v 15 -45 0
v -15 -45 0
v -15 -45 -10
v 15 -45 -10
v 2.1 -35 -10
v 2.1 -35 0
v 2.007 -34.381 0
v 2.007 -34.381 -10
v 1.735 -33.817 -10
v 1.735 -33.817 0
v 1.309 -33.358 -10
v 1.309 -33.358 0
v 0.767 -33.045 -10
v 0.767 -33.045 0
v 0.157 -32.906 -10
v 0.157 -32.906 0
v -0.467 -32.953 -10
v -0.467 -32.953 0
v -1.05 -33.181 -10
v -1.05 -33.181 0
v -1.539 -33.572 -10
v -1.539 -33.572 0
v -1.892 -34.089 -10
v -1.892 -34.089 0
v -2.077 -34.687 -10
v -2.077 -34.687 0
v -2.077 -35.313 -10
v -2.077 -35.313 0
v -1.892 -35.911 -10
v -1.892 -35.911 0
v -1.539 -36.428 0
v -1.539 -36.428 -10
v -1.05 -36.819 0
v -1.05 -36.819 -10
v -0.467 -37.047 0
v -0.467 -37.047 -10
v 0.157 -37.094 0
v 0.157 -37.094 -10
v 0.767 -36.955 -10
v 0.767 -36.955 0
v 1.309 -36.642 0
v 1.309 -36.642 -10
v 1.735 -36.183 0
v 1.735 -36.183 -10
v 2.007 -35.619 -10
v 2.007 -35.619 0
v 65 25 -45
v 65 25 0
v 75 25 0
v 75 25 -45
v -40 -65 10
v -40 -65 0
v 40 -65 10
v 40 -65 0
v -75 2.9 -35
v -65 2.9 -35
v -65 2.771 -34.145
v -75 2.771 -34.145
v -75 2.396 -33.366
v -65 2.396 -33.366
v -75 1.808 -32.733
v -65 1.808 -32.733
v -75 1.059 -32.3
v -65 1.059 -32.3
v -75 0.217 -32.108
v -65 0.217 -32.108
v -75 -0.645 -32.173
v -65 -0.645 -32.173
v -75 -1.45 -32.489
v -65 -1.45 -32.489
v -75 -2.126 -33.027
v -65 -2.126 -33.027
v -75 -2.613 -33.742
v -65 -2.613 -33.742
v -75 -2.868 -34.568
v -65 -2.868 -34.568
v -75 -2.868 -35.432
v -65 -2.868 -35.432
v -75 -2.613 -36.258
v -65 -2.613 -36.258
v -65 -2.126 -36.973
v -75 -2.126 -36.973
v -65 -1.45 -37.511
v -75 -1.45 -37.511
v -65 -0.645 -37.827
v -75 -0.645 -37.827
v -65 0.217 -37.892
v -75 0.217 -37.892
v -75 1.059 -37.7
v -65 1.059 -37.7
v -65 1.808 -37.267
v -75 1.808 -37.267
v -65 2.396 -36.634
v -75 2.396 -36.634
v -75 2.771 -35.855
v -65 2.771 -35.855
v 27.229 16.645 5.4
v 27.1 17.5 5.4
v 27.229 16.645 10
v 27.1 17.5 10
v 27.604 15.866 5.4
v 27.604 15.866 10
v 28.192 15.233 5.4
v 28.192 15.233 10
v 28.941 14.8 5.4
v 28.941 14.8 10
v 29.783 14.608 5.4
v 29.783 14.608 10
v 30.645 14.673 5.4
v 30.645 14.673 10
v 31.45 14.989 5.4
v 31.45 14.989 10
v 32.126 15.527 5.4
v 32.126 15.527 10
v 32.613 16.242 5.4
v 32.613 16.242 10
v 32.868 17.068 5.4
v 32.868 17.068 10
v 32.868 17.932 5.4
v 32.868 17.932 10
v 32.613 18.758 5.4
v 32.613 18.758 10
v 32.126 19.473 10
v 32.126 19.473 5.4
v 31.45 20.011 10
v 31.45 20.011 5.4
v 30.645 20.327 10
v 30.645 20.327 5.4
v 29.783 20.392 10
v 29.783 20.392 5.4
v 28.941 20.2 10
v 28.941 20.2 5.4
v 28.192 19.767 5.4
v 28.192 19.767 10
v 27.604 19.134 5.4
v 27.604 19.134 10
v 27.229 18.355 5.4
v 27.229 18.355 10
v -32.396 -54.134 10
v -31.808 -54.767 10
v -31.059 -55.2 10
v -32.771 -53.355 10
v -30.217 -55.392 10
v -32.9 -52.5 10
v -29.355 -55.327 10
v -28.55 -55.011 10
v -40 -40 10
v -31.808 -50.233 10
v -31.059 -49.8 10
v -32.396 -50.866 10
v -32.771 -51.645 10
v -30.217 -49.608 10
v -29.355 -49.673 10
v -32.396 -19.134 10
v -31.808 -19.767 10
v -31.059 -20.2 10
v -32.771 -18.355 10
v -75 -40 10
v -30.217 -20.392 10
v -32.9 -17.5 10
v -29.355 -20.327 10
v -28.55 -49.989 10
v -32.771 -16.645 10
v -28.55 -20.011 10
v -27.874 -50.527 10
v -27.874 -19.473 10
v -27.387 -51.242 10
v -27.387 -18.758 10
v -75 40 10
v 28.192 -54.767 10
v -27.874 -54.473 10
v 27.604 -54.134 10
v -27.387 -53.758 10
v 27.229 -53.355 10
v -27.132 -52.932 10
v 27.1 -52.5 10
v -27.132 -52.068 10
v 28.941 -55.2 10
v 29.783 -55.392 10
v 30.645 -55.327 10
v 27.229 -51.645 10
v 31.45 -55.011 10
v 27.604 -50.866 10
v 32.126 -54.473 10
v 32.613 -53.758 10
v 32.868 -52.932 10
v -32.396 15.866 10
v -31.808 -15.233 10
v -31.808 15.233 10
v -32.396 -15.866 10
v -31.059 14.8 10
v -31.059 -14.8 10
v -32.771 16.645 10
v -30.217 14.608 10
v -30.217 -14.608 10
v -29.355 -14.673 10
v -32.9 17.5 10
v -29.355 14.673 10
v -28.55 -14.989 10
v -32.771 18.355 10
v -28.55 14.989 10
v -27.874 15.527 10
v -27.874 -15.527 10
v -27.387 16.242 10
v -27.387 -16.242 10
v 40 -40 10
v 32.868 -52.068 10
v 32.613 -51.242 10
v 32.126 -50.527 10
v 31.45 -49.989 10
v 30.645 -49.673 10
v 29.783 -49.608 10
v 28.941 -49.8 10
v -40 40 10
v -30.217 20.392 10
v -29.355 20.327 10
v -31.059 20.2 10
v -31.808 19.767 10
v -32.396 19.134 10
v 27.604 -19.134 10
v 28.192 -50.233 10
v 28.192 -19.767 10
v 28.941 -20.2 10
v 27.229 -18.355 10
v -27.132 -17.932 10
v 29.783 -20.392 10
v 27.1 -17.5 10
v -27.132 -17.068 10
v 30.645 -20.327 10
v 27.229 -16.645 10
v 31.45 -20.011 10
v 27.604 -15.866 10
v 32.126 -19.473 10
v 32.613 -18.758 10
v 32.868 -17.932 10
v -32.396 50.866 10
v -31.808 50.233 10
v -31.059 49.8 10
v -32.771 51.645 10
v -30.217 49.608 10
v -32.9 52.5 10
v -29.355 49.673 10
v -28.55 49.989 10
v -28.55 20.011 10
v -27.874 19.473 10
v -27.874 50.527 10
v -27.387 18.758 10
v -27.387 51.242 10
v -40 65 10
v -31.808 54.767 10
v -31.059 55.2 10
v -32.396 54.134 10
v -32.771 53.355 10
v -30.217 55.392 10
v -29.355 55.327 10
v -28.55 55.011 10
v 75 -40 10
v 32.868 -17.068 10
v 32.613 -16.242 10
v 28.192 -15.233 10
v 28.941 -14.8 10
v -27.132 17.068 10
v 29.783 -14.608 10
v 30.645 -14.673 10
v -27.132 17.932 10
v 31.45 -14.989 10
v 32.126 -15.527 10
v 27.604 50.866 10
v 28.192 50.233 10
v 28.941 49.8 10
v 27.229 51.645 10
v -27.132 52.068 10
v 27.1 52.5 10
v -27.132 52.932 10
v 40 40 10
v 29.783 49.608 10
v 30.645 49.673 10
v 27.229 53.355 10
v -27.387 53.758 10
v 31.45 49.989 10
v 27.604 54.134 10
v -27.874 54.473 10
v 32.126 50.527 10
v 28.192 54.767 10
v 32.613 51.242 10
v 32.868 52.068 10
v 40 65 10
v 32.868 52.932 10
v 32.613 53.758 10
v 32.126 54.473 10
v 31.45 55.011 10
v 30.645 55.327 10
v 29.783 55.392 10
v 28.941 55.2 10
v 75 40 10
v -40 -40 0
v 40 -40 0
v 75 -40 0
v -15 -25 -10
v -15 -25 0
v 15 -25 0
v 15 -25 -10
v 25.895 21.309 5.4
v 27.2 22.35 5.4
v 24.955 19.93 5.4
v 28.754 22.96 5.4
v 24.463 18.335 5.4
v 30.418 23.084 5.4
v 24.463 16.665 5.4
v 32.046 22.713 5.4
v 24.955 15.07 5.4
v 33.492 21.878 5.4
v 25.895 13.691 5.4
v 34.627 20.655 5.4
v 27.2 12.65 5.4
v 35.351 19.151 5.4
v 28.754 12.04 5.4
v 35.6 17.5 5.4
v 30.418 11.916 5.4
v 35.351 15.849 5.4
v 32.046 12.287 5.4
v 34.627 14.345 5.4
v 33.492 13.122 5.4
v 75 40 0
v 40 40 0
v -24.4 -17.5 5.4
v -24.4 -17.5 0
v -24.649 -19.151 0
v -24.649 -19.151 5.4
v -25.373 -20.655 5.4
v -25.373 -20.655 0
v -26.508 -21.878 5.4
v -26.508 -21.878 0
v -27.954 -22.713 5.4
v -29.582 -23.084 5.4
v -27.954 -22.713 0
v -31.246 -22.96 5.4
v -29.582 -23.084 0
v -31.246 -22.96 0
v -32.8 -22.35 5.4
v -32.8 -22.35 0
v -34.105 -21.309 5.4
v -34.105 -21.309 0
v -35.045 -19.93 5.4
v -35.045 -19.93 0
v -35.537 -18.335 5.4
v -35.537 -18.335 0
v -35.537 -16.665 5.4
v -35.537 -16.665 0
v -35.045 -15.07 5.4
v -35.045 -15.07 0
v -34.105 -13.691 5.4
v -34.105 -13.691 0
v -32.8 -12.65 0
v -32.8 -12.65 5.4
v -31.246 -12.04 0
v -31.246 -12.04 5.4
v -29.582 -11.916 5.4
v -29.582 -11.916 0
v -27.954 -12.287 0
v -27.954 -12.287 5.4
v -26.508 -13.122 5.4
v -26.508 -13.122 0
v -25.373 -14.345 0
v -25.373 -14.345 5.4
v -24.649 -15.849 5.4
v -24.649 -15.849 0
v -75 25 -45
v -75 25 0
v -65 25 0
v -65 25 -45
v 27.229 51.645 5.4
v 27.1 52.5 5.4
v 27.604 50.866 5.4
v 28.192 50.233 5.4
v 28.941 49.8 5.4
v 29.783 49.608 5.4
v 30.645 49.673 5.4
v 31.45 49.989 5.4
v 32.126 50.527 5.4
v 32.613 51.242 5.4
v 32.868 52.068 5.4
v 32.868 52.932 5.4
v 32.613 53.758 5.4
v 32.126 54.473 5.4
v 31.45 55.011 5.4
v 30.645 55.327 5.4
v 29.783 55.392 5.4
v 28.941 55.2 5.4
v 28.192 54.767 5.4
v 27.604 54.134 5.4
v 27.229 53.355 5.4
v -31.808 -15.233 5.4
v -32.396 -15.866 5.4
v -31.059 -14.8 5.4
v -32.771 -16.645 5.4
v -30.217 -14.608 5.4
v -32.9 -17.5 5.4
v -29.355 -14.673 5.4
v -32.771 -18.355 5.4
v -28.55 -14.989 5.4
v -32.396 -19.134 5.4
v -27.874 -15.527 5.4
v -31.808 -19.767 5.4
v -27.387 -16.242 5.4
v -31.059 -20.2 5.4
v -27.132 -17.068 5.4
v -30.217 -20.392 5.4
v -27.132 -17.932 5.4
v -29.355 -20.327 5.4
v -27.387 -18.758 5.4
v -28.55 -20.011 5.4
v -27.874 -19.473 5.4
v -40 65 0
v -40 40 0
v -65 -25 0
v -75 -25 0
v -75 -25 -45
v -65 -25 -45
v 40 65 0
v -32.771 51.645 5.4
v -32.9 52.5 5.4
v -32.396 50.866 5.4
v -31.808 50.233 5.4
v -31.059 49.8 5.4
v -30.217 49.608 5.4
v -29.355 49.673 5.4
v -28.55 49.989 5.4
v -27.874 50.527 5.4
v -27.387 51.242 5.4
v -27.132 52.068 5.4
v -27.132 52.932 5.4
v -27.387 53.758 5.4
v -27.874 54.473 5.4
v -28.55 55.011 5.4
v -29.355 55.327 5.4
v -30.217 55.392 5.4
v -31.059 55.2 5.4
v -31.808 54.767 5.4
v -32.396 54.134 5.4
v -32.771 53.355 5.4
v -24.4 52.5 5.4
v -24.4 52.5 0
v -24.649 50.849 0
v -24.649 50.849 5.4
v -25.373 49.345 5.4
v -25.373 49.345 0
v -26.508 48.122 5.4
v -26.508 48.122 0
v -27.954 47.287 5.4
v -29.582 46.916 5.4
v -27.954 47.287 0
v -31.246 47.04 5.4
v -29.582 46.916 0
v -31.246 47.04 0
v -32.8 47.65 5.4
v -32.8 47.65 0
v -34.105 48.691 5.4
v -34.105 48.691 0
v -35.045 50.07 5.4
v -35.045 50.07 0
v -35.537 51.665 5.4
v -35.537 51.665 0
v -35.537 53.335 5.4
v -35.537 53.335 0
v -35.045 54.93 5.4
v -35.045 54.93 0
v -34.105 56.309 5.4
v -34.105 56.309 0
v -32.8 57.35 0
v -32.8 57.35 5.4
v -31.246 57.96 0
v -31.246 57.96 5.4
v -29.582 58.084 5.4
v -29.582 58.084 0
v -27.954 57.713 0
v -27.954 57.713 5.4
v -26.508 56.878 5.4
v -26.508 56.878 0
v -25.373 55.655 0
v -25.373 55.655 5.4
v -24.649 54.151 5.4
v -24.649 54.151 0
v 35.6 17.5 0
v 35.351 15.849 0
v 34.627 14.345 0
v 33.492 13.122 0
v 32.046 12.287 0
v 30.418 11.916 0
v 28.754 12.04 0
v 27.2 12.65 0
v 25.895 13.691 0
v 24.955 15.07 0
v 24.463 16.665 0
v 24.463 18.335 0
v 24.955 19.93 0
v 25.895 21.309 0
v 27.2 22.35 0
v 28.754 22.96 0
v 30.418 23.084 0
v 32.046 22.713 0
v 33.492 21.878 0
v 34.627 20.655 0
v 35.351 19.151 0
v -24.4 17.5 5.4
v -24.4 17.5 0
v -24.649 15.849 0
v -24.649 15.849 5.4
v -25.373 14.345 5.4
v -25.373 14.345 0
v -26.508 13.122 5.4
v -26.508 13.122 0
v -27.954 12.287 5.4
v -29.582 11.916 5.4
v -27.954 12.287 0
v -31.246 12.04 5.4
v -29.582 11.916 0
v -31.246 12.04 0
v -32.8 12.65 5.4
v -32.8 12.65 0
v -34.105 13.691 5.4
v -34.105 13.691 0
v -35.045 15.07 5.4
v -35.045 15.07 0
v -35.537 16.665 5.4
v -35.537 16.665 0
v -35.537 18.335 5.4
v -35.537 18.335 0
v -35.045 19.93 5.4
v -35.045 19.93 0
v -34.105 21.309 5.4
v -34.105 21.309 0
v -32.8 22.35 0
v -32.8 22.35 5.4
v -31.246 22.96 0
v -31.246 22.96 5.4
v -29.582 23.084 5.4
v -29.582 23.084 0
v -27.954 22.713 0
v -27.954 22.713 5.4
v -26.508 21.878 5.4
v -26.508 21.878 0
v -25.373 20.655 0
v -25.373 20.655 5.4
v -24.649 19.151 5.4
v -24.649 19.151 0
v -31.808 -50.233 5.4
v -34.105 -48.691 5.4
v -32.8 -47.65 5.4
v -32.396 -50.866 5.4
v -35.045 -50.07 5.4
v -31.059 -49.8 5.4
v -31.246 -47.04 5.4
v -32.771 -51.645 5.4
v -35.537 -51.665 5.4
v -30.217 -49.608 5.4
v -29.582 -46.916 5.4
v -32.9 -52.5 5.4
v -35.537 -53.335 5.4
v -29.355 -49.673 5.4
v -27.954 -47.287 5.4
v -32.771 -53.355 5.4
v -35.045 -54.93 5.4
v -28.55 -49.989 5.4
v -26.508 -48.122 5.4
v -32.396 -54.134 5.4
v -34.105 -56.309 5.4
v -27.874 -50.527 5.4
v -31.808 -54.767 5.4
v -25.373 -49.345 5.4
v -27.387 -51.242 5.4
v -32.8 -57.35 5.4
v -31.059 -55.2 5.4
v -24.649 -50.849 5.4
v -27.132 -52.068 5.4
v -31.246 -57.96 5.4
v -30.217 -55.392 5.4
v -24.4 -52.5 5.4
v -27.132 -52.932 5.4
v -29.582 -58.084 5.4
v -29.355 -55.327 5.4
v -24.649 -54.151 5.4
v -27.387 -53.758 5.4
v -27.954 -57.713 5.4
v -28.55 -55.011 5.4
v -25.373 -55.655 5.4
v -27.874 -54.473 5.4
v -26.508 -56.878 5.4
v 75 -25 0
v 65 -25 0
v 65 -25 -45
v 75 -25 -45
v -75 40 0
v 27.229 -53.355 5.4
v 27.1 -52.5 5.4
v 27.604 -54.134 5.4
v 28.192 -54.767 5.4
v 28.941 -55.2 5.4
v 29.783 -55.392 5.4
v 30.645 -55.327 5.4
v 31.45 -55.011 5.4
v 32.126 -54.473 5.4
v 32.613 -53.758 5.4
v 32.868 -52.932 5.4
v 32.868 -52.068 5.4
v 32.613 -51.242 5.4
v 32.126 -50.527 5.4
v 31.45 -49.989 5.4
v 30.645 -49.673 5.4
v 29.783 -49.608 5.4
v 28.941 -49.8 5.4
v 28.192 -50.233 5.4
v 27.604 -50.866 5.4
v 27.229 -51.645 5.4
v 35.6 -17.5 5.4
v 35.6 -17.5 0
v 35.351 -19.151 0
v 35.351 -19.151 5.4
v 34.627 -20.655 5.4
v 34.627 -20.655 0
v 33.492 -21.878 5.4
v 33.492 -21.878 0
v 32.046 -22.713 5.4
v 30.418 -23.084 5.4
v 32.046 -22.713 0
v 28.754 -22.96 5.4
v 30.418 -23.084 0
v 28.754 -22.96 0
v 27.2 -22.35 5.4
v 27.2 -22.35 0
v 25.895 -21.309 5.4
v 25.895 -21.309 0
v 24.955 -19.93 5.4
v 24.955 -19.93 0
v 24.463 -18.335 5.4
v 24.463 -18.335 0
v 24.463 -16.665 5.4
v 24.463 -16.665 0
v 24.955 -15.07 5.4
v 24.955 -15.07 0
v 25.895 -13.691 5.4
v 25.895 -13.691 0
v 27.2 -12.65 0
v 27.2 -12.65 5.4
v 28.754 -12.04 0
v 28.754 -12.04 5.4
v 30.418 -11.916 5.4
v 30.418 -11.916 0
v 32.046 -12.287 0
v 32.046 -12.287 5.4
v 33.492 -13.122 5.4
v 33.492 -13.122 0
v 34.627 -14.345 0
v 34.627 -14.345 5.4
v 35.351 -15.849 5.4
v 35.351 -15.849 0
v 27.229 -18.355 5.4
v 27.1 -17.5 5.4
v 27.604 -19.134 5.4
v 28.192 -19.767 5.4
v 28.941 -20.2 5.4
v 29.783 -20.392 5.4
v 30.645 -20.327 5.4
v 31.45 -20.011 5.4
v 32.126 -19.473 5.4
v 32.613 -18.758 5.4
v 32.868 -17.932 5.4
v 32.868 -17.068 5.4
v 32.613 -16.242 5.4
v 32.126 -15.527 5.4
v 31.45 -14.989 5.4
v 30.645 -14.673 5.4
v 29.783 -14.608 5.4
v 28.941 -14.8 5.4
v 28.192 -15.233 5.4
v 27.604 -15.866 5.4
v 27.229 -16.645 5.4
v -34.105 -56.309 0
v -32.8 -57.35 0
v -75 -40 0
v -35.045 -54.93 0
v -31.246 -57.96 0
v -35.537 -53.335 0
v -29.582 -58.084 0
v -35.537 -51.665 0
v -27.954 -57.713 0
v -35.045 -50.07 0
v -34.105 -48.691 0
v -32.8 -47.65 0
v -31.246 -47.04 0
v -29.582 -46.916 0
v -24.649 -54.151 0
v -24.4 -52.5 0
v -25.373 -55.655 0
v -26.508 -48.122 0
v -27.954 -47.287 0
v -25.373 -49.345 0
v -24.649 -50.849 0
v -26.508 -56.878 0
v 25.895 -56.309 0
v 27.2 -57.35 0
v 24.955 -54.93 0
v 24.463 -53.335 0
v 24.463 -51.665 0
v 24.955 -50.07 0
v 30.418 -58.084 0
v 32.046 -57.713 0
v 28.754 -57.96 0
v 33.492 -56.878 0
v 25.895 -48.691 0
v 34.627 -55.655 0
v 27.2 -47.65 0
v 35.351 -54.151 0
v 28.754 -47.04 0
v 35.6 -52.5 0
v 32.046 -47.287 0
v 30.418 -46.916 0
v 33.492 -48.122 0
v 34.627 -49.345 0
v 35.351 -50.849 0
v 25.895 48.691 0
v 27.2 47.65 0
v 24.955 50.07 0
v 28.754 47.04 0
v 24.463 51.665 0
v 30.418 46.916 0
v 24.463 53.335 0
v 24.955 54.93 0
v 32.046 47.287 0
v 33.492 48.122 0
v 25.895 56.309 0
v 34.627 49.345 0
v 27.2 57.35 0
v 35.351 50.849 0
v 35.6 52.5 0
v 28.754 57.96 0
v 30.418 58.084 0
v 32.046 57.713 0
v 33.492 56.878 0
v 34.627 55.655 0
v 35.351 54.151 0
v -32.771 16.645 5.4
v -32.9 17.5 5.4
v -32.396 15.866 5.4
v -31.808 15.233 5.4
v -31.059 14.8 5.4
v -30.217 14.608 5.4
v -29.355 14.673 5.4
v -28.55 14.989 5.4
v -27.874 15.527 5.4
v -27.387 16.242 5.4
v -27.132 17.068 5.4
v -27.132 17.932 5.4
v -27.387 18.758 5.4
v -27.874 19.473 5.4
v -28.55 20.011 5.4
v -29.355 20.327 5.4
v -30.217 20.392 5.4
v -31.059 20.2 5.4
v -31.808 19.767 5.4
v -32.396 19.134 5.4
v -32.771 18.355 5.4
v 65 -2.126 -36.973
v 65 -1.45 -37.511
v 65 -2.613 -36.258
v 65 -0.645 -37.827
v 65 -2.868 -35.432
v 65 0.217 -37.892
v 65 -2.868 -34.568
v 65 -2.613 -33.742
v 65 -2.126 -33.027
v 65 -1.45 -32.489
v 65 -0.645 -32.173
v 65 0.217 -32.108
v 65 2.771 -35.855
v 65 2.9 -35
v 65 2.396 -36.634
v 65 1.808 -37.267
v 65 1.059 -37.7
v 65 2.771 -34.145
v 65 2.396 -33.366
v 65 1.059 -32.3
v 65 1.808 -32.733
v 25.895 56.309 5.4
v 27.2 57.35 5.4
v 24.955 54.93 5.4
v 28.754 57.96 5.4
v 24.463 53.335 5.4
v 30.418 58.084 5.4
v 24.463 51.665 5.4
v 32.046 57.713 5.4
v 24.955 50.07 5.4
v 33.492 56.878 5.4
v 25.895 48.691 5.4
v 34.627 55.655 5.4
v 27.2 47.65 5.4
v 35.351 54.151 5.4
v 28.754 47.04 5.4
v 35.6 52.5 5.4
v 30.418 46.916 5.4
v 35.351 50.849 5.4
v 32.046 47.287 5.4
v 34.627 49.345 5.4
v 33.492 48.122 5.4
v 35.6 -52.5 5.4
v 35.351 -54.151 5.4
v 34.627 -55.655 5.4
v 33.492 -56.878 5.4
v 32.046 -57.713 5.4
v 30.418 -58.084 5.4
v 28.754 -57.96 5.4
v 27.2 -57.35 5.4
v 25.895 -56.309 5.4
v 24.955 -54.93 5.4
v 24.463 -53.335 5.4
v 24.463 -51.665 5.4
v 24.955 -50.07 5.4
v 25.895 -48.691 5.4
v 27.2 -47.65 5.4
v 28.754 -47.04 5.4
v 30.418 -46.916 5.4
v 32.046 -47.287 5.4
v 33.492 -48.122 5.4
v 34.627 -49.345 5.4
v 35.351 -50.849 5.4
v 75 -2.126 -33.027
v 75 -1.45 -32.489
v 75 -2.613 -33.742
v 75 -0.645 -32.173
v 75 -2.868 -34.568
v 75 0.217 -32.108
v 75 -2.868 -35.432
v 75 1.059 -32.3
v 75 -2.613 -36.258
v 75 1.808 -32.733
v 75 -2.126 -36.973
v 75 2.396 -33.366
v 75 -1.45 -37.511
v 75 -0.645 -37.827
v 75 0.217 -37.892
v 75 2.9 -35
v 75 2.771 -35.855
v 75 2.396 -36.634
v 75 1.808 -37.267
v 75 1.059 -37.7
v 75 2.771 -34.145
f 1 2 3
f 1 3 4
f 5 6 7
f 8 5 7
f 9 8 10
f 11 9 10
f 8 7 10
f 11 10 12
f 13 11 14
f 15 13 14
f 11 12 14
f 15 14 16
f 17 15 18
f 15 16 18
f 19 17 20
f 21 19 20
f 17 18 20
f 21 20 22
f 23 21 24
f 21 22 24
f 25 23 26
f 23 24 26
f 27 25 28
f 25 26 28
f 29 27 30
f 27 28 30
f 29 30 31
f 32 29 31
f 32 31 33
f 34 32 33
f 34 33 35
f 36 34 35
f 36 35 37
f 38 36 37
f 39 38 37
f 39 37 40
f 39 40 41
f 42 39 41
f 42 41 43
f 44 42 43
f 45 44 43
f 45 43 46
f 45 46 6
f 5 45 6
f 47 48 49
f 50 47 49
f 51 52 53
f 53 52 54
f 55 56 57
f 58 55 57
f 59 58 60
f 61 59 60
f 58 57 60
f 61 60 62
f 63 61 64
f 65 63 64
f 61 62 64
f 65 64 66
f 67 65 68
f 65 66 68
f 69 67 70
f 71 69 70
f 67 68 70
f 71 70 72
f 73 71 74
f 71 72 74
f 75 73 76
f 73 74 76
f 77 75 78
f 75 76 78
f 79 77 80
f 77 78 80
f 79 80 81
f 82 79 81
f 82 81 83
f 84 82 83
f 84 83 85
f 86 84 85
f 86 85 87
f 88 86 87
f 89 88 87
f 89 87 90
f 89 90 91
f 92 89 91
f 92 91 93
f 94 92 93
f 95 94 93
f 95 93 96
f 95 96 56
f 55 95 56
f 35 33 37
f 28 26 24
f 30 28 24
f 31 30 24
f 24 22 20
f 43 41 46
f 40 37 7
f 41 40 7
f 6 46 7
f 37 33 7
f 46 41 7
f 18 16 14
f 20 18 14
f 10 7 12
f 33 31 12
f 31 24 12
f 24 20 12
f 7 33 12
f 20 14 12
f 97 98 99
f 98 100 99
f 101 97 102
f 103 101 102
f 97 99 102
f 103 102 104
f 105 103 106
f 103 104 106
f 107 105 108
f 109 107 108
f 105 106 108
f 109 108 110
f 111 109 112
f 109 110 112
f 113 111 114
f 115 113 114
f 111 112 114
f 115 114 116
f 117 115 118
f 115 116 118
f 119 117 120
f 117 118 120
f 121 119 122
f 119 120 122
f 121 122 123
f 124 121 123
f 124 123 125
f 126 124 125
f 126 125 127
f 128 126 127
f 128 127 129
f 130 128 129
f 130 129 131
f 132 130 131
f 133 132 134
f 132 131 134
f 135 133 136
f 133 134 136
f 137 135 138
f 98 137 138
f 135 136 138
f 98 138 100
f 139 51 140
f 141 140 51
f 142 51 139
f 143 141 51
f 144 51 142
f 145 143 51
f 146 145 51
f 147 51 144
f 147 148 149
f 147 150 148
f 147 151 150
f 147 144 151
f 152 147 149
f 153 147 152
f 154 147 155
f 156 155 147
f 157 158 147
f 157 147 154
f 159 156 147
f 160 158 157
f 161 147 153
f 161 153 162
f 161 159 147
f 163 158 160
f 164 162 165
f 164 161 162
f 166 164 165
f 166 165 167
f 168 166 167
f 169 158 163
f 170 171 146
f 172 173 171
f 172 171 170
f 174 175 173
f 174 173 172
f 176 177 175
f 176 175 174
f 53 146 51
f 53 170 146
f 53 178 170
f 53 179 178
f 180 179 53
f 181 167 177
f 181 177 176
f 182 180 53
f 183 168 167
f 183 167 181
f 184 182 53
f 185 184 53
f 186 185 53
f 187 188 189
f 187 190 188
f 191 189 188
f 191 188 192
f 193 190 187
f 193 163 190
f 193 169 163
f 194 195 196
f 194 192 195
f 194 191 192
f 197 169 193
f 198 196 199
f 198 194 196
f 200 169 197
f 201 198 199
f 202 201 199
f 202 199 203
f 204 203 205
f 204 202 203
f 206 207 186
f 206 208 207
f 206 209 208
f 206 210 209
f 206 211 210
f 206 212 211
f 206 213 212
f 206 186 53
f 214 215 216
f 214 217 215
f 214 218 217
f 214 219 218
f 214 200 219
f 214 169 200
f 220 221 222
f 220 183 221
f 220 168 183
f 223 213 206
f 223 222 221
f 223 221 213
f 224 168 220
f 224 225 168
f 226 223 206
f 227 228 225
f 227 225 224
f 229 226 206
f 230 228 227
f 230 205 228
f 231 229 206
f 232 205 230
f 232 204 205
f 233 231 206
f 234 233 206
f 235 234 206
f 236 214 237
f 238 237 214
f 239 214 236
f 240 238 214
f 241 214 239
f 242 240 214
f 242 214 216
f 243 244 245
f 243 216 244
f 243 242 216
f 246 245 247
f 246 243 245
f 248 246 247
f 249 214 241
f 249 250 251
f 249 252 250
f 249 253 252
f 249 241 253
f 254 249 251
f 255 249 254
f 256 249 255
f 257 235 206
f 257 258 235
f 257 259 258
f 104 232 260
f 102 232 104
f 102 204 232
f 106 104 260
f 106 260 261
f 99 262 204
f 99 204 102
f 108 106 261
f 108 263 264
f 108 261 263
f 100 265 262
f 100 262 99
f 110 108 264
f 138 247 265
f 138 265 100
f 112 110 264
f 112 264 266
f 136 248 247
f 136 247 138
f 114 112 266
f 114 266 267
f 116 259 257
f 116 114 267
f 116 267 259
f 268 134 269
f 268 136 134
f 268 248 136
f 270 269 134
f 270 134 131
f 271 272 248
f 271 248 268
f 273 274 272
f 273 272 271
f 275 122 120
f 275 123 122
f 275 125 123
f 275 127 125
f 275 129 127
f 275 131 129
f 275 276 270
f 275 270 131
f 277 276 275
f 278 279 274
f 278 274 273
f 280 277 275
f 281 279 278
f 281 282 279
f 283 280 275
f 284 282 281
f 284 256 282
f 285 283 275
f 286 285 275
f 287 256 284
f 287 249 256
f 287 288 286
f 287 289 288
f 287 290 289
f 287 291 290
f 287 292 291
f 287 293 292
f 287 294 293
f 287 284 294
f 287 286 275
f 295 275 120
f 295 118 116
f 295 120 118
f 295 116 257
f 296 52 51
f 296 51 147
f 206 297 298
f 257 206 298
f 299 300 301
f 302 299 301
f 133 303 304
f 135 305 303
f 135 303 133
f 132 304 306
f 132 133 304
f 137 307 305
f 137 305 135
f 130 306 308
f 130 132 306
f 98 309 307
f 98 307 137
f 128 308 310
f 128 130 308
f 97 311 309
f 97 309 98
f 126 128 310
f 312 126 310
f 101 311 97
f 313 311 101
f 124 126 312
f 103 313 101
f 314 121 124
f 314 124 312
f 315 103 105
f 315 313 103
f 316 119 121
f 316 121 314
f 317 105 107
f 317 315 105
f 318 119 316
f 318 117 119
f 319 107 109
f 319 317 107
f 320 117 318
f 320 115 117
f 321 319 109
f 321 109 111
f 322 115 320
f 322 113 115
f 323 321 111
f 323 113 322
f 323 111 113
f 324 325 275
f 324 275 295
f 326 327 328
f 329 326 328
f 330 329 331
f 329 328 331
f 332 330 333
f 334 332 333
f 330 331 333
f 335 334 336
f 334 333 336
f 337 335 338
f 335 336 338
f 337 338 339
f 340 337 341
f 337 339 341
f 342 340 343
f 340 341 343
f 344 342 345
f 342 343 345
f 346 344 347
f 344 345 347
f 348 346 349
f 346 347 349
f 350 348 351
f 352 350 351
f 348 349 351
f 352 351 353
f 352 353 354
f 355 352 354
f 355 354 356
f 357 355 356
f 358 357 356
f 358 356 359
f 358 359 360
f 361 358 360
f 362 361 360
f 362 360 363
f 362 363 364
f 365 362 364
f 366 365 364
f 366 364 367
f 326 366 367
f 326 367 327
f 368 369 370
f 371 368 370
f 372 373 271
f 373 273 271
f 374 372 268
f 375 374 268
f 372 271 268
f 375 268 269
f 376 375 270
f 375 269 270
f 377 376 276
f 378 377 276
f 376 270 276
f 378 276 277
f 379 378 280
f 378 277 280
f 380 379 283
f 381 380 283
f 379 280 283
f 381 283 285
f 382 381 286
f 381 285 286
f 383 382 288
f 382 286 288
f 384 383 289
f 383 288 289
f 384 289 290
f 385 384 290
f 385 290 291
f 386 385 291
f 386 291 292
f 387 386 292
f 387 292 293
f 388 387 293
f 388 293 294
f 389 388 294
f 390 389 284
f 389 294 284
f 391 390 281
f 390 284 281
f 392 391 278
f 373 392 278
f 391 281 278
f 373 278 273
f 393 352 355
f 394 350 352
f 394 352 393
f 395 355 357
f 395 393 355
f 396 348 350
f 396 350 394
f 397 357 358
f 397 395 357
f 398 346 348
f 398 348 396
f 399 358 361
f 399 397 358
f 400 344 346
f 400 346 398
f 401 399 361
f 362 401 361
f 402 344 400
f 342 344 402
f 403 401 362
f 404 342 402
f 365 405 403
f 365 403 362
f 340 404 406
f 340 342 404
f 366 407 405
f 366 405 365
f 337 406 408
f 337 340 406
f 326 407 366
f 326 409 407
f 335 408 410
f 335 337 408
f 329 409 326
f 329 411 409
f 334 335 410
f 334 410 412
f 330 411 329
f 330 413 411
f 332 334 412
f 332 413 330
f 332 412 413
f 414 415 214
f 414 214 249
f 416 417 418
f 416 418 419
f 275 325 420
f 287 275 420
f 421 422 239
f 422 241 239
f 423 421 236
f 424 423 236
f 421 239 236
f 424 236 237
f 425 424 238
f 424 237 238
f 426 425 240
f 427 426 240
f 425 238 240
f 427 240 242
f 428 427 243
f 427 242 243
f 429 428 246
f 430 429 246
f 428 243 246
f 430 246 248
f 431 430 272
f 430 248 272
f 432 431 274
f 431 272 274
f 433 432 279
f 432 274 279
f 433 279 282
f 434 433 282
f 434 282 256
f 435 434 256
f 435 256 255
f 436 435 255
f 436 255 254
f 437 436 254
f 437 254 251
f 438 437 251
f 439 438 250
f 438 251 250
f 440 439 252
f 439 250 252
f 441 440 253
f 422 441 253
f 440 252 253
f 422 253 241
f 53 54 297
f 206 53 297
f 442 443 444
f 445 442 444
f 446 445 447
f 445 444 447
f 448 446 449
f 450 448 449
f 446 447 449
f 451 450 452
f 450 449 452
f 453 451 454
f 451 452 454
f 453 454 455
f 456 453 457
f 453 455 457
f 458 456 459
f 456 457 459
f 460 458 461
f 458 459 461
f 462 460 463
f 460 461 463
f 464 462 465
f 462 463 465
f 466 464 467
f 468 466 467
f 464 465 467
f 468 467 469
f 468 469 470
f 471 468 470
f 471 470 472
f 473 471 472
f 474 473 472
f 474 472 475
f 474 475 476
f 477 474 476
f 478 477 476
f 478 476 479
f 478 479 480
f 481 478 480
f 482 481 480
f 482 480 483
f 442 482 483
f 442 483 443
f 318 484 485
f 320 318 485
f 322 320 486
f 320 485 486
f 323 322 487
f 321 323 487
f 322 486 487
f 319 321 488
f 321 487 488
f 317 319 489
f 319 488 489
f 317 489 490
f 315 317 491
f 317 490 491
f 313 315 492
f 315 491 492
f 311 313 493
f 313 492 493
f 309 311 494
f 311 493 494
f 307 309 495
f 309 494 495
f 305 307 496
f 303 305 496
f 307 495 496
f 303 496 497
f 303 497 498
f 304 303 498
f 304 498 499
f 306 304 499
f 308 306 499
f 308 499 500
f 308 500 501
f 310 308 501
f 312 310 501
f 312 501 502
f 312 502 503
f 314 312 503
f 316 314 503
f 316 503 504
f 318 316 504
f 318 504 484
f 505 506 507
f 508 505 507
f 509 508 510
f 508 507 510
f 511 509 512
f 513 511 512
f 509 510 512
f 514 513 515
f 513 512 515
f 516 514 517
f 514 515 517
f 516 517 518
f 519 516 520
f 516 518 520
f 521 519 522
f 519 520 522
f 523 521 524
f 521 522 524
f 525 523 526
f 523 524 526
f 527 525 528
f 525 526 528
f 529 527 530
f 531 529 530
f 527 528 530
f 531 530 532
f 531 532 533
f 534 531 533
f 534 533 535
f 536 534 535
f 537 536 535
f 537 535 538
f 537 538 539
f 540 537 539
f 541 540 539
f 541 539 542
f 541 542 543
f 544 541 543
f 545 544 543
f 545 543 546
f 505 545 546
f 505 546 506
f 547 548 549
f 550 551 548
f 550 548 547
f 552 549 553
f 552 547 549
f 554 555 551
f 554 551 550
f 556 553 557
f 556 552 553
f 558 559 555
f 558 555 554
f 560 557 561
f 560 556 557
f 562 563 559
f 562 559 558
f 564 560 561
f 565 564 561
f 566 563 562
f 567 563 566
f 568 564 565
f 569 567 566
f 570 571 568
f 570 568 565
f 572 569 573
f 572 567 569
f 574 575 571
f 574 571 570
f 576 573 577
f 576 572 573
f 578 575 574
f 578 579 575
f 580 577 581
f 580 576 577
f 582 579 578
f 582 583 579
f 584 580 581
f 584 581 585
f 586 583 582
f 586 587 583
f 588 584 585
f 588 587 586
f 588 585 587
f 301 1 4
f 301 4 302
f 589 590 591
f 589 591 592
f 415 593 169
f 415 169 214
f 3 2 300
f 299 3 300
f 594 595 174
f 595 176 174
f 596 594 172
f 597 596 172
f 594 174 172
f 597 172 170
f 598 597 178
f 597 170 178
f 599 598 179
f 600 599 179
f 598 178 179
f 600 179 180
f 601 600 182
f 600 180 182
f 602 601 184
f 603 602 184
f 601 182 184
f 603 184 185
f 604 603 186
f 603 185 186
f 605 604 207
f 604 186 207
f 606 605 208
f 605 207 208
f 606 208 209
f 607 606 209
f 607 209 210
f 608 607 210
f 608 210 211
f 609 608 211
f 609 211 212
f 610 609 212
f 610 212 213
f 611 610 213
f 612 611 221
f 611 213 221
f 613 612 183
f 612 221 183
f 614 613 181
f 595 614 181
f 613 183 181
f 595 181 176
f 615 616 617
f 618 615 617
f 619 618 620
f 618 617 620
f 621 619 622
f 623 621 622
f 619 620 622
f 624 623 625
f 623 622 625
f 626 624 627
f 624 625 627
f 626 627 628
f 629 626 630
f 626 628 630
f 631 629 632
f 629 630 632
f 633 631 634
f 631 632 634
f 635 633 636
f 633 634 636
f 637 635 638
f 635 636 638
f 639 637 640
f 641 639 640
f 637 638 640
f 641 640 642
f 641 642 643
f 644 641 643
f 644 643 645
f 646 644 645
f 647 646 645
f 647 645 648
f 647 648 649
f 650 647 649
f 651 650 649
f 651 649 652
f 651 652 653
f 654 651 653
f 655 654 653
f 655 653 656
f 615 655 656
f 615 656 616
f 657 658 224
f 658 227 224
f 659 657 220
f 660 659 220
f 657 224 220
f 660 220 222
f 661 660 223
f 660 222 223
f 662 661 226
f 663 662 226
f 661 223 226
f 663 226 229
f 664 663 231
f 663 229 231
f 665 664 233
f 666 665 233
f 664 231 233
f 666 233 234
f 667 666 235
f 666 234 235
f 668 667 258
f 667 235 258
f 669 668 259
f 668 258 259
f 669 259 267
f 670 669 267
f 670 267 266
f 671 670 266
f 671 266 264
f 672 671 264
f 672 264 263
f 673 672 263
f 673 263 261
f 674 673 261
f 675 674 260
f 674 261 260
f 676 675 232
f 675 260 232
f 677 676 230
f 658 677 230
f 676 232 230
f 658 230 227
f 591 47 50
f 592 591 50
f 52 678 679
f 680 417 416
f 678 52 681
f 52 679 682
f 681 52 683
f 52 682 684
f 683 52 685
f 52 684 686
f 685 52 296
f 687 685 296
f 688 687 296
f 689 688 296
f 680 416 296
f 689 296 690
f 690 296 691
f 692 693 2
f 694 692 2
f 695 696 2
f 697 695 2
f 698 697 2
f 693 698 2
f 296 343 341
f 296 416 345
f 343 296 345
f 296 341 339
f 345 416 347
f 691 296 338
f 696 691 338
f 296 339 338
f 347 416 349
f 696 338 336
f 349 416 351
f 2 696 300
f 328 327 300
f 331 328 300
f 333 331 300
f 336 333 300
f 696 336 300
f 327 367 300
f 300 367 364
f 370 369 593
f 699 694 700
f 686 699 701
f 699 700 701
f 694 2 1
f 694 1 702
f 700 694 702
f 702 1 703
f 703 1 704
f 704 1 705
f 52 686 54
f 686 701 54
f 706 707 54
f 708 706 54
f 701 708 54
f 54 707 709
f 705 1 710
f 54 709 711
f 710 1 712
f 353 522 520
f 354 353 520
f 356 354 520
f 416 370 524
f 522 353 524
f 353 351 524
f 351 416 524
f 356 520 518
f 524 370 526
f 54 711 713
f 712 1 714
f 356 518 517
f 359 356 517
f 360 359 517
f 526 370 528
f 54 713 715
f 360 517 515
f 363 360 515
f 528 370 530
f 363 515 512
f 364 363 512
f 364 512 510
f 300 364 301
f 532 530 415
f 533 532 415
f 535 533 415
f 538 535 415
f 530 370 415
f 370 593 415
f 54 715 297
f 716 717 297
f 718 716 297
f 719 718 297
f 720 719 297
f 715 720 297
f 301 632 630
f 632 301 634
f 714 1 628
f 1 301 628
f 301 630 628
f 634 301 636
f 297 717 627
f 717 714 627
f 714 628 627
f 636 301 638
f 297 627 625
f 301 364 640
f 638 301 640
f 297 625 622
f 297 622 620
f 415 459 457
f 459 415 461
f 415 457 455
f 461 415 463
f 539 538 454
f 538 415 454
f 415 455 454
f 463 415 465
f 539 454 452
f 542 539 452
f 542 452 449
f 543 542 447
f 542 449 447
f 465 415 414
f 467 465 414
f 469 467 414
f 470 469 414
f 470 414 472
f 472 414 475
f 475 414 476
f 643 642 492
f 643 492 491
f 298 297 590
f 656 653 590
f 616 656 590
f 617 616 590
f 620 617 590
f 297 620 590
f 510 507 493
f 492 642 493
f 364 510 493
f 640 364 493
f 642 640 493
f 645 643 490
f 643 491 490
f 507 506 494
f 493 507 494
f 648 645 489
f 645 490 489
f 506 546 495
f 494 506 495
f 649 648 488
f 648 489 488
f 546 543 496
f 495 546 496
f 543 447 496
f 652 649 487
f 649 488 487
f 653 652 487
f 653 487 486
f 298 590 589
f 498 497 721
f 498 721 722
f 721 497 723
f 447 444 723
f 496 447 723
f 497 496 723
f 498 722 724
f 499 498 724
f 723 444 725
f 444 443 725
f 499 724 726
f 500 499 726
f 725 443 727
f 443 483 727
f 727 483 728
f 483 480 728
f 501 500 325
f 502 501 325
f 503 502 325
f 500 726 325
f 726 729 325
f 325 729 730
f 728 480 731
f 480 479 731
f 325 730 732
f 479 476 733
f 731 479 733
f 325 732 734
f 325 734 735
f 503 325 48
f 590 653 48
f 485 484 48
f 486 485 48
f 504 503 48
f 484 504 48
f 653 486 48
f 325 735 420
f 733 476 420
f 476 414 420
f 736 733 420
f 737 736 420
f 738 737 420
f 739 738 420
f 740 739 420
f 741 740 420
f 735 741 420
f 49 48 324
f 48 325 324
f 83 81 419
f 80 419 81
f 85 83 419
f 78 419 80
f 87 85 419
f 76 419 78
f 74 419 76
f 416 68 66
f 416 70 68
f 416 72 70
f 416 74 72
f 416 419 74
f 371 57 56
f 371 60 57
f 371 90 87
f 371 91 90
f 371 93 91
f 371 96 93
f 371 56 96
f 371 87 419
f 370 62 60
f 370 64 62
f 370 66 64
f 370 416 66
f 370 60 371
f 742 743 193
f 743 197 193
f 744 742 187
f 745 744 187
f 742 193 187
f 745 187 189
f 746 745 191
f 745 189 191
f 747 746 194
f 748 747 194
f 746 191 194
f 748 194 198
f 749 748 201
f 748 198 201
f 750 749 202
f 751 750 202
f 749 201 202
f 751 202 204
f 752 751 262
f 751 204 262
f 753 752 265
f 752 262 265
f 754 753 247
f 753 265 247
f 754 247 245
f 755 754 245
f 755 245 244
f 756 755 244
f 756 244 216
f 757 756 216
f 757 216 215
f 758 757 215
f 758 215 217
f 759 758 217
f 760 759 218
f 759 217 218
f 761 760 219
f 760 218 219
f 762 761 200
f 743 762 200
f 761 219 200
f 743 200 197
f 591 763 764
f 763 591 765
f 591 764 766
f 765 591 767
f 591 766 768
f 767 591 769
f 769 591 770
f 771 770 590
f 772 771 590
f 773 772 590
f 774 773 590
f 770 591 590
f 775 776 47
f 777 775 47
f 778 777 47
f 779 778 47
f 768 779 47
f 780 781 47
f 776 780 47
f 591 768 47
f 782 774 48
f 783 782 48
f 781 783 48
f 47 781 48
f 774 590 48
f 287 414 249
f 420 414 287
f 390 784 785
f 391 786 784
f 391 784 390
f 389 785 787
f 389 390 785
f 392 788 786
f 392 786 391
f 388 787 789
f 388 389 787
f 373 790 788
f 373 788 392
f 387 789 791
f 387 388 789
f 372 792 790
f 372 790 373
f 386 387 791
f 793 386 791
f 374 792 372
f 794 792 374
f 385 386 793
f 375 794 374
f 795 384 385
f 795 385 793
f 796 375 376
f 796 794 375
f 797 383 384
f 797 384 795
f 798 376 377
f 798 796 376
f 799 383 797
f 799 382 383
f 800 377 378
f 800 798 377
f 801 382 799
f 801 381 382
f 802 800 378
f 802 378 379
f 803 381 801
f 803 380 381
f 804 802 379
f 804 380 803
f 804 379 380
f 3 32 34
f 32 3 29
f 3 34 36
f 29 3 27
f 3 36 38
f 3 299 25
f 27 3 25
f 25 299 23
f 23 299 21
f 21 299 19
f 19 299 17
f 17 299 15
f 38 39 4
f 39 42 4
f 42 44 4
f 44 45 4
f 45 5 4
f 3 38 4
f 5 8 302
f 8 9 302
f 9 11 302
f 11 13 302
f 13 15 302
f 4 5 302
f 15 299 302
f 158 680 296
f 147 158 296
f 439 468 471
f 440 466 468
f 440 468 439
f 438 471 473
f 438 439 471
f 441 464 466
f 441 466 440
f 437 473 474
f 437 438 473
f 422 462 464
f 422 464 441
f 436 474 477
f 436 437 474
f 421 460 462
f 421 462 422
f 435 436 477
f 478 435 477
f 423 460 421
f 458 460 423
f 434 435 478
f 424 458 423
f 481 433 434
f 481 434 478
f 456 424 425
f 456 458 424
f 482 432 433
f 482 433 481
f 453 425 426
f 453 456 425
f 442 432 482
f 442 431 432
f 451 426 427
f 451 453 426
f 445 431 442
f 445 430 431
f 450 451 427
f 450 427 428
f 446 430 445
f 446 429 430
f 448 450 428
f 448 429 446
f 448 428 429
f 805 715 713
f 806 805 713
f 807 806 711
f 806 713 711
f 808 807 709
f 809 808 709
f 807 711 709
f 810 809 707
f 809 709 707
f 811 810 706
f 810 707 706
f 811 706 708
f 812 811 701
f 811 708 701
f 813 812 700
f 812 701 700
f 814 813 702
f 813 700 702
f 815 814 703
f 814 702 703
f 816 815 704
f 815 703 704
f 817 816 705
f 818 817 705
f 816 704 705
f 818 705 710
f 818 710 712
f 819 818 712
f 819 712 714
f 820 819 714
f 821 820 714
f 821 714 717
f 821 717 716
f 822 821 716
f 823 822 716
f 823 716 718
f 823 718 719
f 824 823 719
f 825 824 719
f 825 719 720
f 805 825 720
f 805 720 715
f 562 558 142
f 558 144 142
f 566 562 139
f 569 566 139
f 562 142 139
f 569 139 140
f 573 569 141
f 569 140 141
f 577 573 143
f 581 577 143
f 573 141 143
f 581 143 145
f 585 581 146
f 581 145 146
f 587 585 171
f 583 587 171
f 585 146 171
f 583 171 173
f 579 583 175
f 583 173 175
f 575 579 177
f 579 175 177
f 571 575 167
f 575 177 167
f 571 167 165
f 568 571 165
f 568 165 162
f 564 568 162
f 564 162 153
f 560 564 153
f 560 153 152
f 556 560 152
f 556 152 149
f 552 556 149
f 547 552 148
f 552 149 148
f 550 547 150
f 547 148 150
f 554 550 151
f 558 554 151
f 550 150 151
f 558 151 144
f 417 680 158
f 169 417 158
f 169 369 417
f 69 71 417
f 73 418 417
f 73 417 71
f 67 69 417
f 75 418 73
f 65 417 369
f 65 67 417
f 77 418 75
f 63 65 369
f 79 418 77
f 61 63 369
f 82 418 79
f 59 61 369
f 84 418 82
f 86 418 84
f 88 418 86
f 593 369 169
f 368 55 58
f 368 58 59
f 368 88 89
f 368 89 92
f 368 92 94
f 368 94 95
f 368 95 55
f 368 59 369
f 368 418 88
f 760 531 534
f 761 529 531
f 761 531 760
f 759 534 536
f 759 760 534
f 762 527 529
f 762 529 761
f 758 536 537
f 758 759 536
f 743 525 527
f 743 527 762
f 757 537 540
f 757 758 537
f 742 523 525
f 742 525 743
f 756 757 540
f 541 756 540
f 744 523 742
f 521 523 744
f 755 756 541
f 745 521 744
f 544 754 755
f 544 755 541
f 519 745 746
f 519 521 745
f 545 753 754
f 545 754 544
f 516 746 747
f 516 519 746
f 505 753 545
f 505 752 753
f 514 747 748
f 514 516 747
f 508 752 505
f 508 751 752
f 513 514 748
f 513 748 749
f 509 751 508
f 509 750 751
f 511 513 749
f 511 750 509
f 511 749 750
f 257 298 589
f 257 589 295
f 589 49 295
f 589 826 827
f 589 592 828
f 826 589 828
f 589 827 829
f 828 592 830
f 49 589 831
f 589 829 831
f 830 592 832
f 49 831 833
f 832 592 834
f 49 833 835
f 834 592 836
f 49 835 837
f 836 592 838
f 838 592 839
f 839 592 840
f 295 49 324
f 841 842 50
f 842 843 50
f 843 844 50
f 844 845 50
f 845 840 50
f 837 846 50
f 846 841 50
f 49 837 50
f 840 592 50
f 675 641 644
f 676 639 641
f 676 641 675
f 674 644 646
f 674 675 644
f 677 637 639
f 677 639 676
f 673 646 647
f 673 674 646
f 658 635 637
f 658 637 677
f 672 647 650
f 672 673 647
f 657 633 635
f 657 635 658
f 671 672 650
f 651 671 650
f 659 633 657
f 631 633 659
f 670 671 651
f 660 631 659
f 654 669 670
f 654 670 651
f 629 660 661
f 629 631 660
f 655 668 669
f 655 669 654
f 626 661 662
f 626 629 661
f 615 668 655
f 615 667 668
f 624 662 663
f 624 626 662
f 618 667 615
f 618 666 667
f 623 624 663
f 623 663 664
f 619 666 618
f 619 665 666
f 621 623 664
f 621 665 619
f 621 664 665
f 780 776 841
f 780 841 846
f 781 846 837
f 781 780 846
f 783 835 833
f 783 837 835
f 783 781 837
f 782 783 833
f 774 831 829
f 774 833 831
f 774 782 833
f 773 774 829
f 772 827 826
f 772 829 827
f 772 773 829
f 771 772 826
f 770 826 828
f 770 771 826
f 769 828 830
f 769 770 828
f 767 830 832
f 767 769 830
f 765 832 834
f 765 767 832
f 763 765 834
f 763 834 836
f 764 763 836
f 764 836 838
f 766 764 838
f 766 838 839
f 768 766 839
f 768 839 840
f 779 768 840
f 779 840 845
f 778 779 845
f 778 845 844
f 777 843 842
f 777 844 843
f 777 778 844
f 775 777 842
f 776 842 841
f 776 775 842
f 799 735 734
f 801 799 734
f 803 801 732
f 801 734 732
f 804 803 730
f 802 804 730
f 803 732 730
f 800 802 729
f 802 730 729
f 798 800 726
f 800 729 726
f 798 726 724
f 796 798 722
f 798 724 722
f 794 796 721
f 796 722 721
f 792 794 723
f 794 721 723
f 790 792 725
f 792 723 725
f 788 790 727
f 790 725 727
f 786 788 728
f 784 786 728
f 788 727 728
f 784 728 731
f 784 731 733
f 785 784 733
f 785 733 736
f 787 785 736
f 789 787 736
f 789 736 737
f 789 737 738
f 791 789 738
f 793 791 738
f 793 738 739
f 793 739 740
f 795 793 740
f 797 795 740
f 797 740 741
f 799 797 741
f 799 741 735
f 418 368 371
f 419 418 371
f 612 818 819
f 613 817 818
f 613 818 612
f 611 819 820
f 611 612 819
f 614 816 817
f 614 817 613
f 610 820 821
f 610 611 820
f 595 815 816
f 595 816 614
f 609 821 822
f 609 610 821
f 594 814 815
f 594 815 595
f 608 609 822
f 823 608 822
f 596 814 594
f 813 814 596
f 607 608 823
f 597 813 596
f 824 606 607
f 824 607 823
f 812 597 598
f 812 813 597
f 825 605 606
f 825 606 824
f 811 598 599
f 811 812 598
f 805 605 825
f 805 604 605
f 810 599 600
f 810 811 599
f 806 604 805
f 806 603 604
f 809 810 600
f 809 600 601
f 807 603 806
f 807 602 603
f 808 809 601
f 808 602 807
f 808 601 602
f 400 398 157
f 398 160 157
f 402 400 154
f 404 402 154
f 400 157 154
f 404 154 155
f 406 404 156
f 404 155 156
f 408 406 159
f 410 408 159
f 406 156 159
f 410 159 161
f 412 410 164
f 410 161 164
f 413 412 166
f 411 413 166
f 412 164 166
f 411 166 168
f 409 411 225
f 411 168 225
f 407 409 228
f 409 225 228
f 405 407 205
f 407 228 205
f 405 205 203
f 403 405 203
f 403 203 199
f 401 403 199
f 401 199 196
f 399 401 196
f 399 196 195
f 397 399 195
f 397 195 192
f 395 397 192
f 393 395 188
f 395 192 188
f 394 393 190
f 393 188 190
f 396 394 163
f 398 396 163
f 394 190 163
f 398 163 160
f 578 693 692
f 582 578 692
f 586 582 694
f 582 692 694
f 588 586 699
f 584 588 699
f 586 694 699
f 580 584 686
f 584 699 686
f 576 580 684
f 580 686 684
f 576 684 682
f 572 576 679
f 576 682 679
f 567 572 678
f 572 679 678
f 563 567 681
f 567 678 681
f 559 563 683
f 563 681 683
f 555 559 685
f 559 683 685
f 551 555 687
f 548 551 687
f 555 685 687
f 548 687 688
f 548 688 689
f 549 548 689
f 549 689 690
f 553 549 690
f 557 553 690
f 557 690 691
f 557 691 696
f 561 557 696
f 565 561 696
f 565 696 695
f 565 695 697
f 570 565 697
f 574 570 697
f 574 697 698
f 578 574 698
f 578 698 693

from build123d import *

# Parameters (mm, degrees)
SKETCH043_W         = 150
SKETCH043_H         = 80
SKETCH043_W_2       = 80
SKETCH043_H_2       = 25
PAD021_DEPTH        = 10
HOLE020_D           = 5.8
HOLE020_DEPTH       = 25
HOLE020_CBORE_D     = 11.2
HOLE020_CBORE_DEPTH = 5.4
SKETCH044_W         = 10
SKETCH044_H         = 50
PAD022_DEPTH        = 45
SKETCH045_R         = 2.9
HOLE021_DEPTH       = 75.001
SKETCH046_R         = 2.9
HOLE022_DEPTH       = 75.001
SKETCH047_W         = 30
SKETCH047_H         = 20
PAD023_DEPTH        = 10
SKETCH048_R         = 2.1
HOLE023_DEPTH       = 45.001


with BuildPart() as part:
    # Sketch043 → Pad021 (new body)
    with BuildSketch(Plane.XY):
        Rectangle(SKETCH043_W, SKETCH043_H)
        with Locations((0, 52.5)):
            Rectangle(SKETCH043_W_2, SKETCH043_H_2)
        with Locations((0, -52.5)):
            Rectangle(SKETCH043_W_2, SKETCH043_H_2)
    extrude(amount=PAD021_DEPTH)

    # Hole020
    with Locations(Plane(origin=(0, 0, 0), x_dir=(1, 0, 0), z_dir=(0, 0, -1))):
        with Locations((-30, -52.5), (30, -52.5), (-30, -17.5), (30, -17.5), (-30, 17.5), (30, 17.5), (-30, 52.5), (30, 52.5)):
            CounterBoreHole(HOLE020_D / 2, HOLE020_CBORE_D / 2, HOLE020_CBORE_DEPTH, depth=HOLE020_DEPTH)

    # Sketch044 → Pad022 (join)
    with BuildSketch(Plane.XY):
        with Locations((-70, 0)):
            Rectangle(SKETCH044_W, SKETCH044_H)
        with Locations((70, 0)):
            Rectangle(SKETCH044_W, SKETCH044_H)
    extrude(amount=-PAD022_DEPTH)

    # Sketch045 → Hole021 (cut, through all)
    with BuildSketch(Plane.YZ):
        with Locations((0, -35)):
            Circle(SKETCH045_R)
    extrude(amount=-HOLE021_DEPTH, mode=Mode.SUBTRACT)

    # Sketch046 → Hole022 (cut, through all)
    with BuildSketch(Plane.YZ):
        with Locations((0, -35)):
            Circle(SKETCH046_R)
    extrude(amount=HOLE022_DEPTH, mode=Mode.SUBTRACT)

    # Sketch047 → Pad023 (join)
    with BuildSketch(Plane.XY):
        with Locations((0, -35)):
            Rectangle(SKETCH047_W, SKETCH047_H)
    extrude(amount=-PAD023_DEPTH)

    # Sketch048 → Hole023 (cut, through all)
    with BuildSketch(Plane.XY):
        with Locations((0, -35)):
            Circle(SKETCH048_R)
    extrude(amount=-HOLE023_DEPTH, mode=Mode.SUBTRACT)


solid = part.part
